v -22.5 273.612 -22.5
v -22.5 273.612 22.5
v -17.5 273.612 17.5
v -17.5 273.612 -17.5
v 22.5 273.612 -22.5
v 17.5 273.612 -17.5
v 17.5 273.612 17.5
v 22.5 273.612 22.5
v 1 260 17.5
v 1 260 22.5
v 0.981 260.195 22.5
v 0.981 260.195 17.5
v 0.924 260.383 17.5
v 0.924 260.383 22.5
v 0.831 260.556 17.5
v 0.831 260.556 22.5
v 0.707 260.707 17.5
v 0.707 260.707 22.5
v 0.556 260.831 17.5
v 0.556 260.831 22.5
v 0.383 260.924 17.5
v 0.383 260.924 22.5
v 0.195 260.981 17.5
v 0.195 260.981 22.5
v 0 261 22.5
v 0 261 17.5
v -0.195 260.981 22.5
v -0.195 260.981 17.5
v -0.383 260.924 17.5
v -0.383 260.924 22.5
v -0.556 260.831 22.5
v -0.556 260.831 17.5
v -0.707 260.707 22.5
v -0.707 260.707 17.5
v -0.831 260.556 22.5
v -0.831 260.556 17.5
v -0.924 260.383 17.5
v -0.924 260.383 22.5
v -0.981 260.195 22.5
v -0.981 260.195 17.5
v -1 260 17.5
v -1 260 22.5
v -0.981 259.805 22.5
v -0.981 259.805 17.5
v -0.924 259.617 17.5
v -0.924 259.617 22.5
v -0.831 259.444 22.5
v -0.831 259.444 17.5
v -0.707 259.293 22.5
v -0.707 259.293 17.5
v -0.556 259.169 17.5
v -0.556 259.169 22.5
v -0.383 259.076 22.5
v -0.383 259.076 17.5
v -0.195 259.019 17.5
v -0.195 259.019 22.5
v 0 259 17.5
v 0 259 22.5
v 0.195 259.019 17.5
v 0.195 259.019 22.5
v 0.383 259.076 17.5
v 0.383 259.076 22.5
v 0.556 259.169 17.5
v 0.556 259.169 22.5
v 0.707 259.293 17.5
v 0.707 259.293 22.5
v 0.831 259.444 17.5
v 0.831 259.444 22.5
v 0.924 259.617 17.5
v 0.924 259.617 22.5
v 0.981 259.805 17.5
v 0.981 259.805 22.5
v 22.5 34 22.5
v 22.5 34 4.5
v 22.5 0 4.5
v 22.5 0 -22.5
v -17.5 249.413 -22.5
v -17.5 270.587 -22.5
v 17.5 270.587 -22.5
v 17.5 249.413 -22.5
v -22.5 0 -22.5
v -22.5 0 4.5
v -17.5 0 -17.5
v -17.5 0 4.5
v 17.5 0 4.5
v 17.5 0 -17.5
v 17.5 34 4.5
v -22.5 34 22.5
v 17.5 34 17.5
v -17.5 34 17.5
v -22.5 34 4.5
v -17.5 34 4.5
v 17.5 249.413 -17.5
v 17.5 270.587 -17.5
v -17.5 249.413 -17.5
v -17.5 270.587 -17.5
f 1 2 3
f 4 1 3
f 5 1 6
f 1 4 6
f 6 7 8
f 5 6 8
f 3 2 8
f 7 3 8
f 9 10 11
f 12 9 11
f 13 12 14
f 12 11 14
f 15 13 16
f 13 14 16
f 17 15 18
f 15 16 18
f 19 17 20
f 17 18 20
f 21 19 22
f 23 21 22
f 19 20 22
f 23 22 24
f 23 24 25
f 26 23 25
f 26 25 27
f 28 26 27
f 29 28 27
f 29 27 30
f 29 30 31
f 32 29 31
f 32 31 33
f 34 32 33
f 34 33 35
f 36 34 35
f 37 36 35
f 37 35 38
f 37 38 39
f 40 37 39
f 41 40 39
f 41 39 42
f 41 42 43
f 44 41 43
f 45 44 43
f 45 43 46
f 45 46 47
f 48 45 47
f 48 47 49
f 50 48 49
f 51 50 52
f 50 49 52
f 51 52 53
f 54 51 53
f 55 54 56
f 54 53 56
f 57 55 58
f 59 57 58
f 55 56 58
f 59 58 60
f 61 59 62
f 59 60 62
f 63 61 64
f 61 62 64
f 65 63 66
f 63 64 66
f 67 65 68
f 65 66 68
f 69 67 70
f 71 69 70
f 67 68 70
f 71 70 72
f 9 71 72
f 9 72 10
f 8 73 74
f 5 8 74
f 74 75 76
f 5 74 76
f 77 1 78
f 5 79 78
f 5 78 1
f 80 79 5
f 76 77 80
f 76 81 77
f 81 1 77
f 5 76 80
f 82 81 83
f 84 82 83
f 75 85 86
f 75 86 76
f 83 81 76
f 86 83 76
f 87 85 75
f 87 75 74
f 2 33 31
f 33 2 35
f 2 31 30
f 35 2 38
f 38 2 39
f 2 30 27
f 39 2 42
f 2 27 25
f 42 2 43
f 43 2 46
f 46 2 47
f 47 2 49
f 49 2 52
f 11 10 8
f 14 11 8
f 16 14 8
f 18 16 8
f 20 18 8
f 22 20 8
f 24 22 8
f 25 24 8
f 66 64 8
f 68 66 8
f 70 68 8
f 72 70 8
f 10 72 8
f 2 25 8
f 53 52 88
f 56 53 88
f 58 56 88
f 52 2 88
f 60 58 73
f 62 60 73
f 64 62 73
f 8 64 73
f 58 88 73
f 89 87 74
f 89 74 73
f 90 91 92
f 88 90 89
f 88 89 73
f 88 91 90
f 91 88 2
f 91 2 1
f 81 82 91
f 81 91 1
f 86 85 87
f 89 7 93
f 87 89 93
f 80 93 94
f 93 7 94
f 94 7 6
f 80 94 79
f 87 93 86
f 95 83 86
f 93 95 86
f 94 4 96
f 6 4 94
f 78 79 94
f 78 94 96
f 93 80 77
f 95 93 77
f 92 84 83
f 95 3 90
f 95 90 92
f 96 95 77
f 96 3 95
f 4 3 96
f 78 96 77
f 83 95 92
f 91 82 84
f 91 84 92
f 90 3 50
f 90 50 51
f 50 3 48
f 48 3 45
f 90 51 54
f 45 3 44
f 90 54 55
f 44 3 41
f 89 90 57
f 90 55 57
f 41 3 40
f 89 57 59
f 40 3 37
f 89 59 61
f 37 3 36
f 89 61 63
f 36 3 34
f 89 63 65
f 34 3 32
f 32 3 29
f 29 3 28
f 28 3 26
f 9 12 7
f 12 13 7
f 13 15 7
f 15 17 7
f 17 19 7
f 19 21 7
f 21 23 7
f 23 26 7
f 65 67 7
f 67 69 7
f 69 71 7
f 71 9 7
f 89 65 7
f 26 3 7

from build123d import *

# Parameters (mm, degrees)
CROQUIS1_W              = 45
CROQUIS1_H              = 45
SALIENTE_EXTRUIR1_DEPTH = 300
CROQUIS4_W              = 18
CROQUIS4_H              = 34
CORTAR_EXTRUIR2_DEPTH   = 46
CROQUIS8_W              = 35
CROQUIS8_H              = 35
CORTAR_EXTRUIR3_DEPTH   = 301
CROQUIS9_W              = 35
CROQUIS9_H              = 21.174410022
CORTAR_EXTRUIR4_DEPTH   = 10
CROQUIS10_R             = 1
CORTAR_EXTRUIR5_DEPTH   = 10
CROQUIS11_W             = 45
CROQUIS11_H             = 26.387879272
CORTAR_EXTRUIR6_DEPTH   = 46


with BuildPart() as part:
    # Croquis1 → Saliente-Extruir1 (new body)
    with BuildSketch(Plane(origin=(0, 0, 0), x_dir=(1, 0, 0), z_dir=(0, 1, 0))):
        Rectangle(CROQUIS1_W, CROQUIS1_H)
    extrude(amount=SALIENTE_EXTRUIR1_DEPTH)

    # Croquis4 → Cortar-Extruir2 (cut, through all)
    with BuildSketch(Plane.ZY.offset(22.5)):
        with Locations((13.5, 17)):
            Rectangle(CROQUIS4_W, CROQUIS4_H)
    extrude(amount=-CORTAR_EXTRUIR2_DEPTH, mode=Mode.SUBTRACT)

    # Croquis8 → Cortar-Extruir3 (cut, through all)
    with BuildSketch(Plane(origin=(0, 300, 0), x_dir=(1, 0, 0), z_dir=(0, 1, 0))):
        Rectangle(CROQUIS8_W, CROQUIS8_H)
    extrude(amount=-CORTAR_EXTRUIR3_DEPTH, mode=Mode.SUBTRACT)

    # Croquis9 → Cortar-Extruir4 (cut)
    with BuildSketch(Plane(origin=(0, 0, -22.5), x_dir=(-1, 0, 0), z_dir=(0, 0, -1))):
        with Locations((0, 260)):
            Rectangle(CROQUIS9_W, CROQUIS9_H)
    extrude(amount=-CORTAR_EXTRUIR4_DEPTH, mode=Mode.SUBTRACT)

    # Croquis10 → Cortar-Extruir5 (cut)
    with BuildSketch(Plane.XY.offset(22.5)):
        with Locations((0, 260)):
            Circle(CROQUIS10_R)
    extrude(amount=-CORTAR_EXTRUIR5_DEPTH, mode=Mode.SUBTRACT)

    # Croquis11 → Cortar-Extruir6 (cut, through all)
    with BuildSketch(Plane.XY.offset(22.5)):
        with Locations((0, 286.806060364)):
            Rectangle(CROQUIS11_W, CROQUIS11_H)
    extrude(amount=-CORTAR_EXTRUIR6_DEPTH, mode=Mode.SUBTRACT)


solid = part.part
